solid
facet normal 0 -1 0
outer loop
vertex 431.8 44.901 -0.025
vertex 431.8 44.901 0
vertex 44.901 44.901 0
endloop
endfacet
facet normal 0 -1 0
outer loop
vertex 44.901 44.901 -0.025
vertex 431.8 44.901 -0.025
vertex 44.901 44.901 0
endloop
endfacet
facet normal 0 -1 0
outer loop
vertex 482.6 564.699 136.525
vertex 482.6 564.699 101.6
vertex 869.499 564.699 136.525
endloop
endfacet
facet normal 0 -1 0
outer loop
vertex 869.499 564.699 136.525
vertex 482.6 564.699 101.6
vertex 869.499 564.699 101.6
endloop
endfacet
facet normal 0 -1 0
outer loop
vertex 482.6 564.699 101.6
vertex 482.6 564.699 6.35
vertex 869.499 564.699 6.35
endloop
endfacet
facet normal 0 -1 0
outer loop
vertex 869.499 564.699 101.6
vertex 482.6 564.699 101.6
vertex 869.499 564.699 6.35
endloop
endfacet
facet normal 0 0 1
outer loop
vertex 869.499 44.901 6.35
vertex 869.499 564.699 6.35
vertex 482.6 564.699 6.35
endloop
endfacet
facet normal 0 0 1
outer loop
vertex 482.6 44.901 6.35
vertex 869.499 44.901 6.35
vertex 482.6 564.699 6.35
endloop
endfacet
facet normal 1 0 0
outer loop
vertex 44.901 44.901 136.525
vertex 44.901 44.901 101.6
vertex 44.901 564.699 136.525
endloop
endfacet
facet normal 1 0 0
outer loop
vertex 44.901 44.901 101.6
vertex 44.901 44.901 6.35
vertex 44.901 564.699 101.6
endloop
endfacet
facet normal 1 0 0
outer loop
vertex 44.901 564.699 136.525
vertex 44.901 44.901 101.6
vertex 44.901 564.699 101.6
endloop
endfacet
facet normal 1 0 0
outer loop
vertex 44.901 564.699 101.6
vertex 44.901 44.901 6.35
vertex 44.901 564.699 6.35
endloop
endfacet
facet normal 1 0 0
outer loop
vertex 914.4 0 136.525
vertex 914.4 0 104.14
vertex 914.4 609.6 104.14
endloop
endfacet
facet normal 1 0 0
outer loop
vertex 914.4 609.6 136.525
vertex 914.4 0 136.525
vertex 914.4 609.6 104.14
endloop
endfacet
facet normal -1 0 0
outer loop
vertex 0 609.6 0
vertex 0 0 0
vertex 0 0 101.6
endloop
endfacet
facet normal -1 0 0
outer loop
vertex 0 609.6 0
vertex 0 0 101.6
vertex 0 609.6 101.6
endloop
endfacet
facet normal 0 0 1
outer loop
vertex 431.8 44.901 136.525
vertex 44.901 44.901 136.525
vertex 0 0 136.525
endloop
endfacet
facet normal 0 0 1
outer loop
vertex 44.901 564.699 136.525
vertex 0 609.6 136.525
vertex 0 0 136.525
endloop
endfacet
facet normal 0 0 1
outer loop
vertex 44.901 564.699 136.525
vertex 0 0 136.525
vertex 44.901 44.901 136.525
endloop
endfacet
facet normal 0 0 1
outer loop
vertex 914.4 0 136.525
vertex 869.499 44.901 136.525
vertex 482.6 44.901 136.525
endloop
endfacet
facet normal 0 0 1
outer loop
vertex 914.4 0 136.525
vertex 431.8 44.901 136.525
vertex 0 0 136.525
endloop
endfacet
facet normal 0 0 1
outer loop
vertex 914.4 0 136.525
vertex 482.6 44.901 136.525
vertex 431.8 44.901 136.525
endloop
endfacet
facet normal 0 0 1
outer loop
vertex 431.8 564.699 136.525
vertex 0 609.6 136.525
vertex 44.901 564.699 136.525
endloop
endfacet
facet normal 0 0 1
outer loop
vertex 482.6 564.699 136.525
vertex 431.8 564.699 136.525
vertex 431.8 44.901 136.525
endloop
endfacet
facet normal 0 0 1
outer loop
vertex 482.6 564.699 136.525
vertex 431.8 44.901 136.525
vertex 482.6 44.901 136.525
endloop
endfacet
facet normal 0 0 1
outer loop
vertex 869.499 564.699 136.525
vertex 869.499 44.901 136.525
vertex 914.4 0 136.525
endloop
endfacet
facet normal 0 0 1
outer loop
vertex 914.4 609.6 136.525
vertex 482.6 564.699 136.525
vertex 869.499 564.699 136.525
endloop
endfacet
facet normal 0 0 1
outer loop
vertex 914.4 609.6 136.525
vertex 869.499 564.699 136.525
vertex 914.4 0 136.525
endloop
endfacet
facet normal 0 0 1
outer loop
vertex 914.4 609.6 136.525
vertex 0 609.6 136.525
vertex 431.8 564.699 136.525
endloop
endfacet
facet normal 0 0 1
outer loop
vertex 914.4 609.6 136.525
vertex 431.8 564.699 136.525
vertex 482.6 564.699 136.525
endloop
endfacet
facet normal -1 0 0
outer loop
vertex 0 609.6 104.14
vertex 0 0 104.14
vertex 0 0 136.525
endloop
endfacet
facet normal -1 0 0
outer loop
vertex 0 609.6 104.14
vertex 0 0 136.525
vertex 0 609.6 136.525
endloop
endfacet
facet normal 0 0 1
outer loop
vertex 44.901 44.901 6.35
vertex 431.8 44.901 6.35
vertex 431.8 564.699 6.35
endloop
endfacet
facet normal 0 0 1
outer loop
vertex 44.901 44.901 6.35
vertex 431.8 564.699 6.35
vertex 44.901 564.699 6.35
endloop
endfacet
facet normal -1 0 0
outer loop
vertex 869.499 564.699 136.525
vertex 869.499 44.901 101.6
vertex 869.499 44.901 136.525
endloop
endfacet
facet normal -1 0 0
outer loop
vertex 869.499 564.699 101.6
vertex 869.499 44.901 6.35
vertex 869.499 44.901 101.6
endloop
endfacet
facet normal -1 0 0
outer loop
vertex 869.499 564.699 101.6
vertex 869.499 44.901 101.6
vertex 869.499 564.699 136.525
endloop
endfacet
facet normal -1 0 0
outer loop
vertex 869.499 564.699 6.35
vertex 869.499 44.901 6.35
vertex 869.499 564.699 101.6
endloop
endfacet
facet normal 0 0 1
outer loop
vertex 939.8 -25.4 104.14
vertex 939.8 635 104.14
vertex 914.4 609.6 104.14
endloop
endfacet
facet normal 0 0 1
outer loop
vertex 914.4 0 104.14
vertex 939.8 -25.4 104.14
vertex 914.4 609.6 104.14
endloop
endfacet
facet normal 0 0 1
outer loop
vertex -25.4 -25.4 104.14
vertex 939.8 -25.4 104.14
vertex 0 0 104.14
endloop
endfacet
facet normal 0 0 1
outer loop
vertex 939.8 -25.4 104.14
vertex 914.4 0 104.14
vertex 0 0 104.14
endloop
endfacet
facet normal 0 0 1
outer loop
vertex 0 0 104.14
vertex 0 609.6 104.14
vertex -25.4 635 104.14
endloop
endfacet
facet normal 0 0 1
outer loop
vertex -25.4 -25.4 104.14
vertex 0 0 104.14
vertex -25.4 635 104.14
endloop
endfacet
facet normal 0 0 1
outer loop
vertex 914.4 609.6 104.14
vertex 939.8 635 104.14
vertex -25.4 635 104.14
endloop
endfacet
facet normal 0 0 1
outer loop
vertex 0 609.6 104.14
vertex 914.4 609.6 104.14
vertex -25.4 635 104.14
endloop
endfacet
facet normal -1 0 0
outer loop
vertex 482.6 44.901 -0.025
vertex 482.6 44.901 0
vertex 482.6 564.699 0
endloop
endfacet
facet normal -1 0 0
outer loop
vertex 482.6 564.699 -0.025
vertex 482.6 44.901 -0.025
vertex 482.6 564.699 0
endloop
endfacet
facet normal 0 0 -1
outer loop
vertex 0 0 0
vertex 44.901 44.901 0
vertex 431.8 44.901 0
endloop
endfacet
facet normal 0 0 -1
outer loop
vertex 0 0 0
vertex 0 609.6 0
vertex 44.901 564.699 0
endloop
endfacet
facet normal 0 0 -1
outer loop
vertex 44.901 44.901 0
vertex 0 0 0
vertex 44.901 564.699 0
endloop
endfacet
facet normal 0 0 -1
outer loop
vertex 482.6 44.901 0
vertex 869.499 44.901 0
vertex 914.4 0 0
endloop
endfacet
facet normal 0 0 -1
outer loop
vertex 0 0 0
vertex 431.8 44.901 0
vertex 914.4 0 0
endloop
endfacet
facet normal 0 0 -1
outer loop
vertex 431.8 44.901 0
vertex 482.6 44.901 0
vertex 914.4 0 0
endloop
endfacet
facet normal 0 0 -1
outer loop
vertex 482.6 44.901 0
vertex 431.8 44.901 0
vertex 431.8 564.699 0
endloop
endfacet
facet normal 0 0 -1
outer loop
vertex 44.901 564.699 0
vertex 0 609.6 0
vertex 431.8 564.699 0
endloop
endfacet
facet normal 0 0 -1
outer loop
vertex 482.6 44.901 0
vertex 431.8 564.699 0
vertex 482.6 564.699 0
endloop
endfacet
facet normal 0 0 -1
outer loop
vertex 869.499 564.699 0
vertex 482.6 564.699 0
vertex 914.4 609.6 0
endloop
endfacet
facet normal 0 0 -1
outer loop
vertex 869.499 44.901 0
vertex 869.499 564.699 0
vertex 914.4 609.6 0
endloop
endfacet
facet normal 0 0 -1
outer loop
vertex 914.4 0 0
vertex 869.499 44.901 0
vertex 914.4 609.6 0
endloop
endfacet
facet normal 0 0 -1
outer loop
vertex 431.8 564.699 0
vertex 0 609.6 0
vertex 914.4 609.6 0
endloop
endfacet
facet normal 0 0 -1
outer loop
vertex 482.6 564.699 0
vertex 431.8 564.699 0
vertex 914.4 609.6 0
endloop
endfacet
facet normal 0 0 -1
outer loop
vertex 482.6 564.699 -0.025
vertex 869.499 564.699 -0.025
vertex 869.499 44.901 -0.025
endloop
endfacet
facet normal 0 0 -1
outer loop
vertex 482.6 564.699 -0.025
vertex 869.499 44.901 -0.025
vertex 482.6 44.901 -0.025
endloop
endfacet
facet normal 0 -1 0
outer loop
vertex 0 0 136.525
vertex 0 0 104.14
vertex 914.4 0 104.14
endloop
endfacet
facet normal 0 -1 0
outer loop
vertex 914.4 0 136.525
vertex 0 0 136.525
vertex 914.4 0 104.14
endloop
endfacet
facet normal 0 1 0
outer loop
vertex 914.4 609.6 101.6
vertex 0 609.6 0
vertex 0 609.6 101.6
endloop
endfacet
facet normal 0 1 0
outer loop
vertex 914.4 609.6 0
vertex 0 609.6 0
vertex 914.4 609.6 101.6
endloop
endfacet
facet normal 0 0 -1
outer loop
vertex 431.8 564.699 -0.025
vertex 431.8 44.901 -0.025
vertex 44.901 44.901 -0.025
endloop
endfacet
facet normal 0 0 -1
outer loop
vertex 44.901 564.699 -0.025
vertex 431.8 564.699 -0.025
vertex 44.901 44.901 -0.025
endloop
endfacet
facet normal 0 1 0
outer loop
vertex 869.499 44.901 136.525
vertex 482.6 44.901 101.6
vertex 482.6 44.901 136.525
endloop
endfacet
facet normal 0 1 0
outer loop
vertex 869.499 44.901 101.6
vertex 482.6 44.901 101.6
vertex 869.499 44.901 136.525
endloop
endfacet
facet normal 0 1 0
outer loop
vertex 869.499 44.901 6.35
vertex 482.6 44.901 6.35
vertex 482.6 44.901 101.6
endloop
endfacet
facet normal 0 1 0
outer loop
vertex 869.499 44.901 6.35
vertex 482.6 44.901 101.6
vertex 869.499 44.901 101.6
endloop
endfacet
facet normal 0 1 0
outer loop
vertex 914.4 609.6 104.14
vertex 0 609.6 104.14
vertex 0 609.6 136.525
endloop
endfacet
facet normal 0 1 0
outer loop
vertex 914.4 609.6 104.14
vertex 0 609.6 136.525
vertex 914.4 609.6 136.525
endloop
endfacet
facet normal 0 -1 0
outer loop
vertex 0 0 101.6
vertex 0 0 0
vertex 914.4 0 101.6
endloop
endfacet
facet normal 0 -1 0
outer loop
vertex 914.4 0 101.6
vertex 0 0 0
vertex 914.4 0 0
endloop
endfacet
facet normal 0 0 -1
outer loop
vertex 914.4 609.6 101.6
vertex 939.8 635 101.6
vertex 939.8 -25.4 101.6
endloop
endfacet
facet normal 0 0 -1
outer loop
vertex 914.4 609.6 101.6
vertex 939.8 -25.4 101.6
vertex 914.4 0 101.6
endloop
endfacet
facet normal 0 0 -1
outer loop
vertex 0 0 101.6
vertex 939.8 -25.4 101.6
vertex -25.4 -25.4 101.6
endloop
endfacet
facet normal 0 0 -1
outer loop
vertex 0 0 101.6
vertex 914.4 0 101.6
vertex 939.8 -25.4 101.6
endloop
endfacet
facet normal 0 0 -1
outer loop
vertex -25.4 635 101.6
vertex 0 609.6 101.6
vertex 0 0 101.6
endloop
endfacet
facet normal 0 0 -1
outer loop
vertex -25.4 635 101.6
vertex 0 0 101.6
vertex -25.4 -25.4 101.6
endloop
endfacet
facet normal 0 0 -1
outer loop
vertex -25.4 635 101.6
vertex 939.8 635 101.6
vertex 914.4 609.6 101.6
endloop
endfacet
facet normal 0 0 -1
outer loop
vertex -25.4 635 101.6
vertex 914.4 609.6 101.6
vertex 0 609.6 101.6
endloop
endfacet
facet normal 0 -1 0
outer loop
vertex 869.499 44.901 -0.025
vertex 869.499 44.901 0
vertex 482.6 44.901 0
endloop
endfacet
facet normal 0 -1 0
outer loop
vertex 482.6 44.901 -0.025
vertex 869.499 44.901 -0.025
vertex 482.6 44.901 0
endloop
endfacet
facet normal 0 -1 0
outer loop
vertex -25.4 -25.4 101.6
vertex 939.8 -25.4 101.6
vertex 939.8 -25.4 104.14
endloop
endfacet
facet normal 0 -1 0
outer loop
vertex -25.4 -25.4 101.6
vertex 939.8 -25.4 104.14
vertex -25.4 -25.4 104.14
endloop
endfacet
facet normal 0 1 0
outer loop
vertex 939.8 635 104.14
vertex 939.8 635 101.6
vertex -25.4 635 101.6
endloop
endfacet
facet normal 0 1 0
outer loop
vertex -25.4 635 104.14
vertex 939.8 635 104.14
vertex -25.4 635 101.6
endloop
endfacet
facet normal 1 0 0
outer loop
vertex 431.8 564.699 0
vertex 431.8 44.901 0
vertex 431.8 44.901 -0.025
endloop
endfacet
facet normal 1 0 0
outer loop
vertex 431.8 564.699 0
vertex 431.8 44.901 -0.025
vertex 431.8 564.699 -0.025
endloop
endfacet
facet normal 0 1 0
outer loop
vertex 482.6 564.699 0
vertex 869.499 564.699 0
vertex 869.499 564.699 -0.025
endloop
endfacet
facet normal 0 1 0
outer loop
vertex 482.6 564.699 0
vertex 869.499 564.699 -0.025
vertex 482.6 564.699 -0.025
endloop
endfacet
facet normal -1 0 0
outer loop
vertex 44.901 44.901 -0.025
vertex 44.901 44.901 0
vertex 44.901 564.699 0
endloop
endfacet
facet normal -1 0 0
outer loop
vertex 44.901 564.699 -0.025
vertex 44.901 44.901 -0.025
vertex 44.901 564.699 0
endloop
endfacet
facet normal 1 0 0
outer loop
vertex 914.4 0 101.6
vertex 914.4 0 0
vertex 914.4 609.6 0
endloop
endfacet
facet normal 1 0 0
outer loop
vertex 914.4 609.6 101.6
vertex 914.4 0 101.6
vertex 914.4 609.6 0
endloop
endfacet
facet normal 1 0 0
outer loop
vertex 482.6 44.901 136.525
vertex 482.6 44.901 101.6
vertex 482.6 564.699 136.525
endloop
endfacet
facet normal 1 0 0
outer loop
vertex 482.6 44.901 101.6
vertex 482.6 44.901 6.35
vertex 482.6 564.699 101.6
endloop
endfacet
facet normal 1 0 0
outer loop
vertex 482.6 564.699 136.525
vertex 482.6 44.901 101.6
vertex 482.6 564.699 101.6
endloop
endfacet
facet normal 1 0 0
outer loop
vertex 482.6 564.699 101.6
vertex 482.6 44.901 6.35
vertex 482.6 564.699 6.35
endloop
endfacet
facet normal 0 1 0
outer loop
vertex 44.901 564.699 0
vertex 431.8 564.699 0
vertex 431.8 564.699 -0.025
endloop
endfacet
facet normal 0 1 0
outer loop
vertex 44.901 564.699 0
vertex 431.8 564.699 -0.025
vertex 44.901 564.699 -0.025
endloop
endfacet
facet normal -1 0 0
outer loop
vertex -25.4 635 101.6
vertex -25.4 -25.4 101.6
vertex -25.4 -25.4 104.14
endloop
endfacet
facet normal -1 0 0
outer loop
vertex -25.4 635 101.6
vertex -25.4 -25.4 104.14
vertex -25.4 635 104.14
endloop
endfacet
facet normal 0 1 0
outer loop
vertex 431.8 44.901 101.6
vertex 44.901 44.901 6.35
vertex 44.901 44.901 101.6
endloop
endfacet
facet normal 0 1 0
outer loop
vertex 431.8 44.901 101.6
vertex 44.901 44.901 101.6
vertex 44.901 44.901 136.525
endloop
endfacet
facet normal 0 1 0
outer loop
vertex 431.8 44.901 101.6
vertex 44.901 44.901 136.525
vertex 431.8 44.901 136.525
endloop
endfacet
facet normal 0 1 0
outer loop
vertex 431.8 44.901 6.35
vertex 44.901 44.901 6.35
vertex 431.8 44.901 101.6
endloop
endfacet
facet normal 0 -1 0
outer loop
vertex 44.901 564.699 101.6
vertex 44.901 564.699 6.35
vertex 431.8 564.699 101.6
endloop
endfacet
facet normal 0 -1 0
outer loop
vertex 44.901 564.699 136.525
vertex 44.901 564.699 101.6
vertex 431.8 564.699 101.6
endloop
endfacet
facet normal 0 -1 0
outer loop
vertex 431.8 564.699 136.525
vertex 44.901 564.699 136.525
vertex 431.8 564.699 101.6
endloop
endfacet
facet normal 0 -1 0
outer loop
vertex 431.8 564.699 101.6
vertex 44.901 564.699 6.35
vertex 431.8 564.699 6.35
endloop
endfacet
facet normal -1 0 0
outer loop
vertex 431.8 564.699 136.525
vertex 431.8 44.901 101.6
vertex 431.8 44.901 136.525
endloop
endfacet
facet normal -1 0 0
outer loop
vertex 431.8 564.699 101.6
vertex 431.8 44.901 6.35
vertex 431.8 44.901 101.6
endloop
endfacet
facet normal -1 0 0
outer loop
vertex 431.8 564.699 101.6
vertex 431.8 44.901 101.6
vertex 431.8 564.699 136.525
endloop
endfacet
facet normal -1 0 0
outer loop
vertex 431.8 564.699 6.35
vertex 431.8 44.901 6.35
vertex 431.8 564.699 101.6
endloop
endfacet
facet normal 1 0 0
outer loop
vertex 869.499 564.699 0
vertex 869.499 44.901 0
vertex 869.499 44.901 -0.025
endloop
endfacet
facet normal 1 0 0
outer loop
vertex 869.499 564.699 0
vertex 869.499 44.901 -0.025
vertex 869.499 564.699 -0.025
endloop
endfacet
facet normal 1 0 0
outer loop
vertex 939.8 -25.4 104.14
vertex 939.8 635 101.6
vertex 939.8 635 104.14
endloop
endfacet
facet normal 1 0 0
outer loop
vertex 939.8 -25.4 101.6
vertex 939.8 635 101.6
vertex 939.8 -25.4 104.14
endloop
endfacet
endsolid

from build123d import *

# Parameters (mm, degrees)
SKETCH1_W                = 914.4
SKETCH1_H                = 609.6
SKETCH1_W_2              = 824.59743879
SKETCH1_H_2              = 519.79743879
BOSS_EXTRUDE1_DEPTH      = 101.6
SKETCH2_W                = 914.4
SKETCH2_H                = 609.6
BOSS_EXTRUDE2_DEPTH      = 2.54
BOSS_EXTRUDE3_REACH      = 1116.579
SKETCH4_W                = 914.4
SKETCH4_H                = 609.6
SKETCH4_W_2              = 386.898719395
SKETCH4_H_2              = 519.79743879
BOSS_EXTRUDE4_DEPTH      = 34.925
BOSS_EXTRUDE5_DEPTH      = 0.0254
BOSS_EXTRUDE5_DEPTH_BACK = 6.35
SKETCH5_W                = 386.898719395
SKETCH5_H                = 519.79743879


with BuildPart() as part:
    # Sketch1 → Boss-Extrude1 (new body)
    with BuildSketch(Plane.XY):
        with Locations((457.2, 304.8)):
            Rectangle(SKETCH1_W, SKETCH1_H)
        with Locations((457.2, 304.8)):
            Rectangle(SKETCH1_W_2, SKETCH1_H_2, mode=Mode.SUBTRACT)
    extrude(amount=BOSS_EXTRUDE1_DEPTH)

    # Sketch3 → Boss-Extrude3 (add, up to next)
    with BuildSketch(Plane(origin=(0, 44.901280605, 0), x_dir=(1, 0, 0), z_dir=(0, 1, 0)), mode=Mode.PRIVATE) as boss_extrude3_sk1:
        Polygon((457.2, 0), (482.6, 0), (482.6, -101.6), (431.8, -101.6), (431.8, 0), align=None)
    boss_extrude3_tool1 = extrude(boss_extrude3_sk1.sketch, amount=BOSS_EXTRUDE3_REACH, mode=Mode.PRIVATE) - part.part
    add(boss_extrude3_tool1.solids().sort_by_distance((457.2, 44.901281, 50.8))[0])



with BuildPart() as body_2:
    # Sketch2 → Boss-Extrude2 (new body)
    with BuildSketch(Plane.XY.offset(101.6)):
        Polygon((0, 635), (939.8, 635), (939.8, -25.4), (-25.4, -25.4), (-25.4, 635), align=None)
        with Locations((457.2, 304.8)):
            Rectangle(SKETCH2_W, SKETCH2_H, mode=Mode.SUBTRACT)
    extrude(amount=BOSS_EXTRUDE2_DEPTH)


with BuildPart() as part_1:
    add(part.part)

    add(body_2.part)  # Boss-Extrude4 merges body 2
    # Sketch4 → Boss-Extrude4 (add)
    with BuildSketch(Plane.XY.offset(101.6)):
        with Locations((457.2, 304.8)):
            Rectangle(SKETCH4_W, SKETCH4_H)
        with Locations((238.350640303, 304.8)):
            Rectangle(SKETCH4_W_2, SKETCH4_H_2, mode=Mode.SUBTRACT)
        with Locations((676.049359697, 304.8)):
            Rectangle(SKETCH4_W_2, SKETCH4_H_2, mode=Mode.SUBTRACT)
    extrude(amount=BOSS_EXTRUDE4_DEPTH)

    # Sketch5 → Boss-Extrude5 (add, two sides: drawn at the far end of the back side and taken through both)
    with BuildSketch(Plane(origin=(0, 0, 0), x_dir=(-1, 0, 0), z_dir=(0, 0, -1)).offset(-BOSS_EXTRUDE5_DEPTH_BACK)):
        with Locations((-676.049359697, 304.8)):
            Rectangle(SKETCH5_W, SKETCH5_H)
        with Locations((-238.350640303, 304.8)):
            Rectangle(SKETCH5_W, SKETCH5_H)
    extrude(amount=BOSS_EXTRUDE5_DEPTH + BOSS_EXTRUDE5_DEPTH_BACK)


solid = part_1.part
